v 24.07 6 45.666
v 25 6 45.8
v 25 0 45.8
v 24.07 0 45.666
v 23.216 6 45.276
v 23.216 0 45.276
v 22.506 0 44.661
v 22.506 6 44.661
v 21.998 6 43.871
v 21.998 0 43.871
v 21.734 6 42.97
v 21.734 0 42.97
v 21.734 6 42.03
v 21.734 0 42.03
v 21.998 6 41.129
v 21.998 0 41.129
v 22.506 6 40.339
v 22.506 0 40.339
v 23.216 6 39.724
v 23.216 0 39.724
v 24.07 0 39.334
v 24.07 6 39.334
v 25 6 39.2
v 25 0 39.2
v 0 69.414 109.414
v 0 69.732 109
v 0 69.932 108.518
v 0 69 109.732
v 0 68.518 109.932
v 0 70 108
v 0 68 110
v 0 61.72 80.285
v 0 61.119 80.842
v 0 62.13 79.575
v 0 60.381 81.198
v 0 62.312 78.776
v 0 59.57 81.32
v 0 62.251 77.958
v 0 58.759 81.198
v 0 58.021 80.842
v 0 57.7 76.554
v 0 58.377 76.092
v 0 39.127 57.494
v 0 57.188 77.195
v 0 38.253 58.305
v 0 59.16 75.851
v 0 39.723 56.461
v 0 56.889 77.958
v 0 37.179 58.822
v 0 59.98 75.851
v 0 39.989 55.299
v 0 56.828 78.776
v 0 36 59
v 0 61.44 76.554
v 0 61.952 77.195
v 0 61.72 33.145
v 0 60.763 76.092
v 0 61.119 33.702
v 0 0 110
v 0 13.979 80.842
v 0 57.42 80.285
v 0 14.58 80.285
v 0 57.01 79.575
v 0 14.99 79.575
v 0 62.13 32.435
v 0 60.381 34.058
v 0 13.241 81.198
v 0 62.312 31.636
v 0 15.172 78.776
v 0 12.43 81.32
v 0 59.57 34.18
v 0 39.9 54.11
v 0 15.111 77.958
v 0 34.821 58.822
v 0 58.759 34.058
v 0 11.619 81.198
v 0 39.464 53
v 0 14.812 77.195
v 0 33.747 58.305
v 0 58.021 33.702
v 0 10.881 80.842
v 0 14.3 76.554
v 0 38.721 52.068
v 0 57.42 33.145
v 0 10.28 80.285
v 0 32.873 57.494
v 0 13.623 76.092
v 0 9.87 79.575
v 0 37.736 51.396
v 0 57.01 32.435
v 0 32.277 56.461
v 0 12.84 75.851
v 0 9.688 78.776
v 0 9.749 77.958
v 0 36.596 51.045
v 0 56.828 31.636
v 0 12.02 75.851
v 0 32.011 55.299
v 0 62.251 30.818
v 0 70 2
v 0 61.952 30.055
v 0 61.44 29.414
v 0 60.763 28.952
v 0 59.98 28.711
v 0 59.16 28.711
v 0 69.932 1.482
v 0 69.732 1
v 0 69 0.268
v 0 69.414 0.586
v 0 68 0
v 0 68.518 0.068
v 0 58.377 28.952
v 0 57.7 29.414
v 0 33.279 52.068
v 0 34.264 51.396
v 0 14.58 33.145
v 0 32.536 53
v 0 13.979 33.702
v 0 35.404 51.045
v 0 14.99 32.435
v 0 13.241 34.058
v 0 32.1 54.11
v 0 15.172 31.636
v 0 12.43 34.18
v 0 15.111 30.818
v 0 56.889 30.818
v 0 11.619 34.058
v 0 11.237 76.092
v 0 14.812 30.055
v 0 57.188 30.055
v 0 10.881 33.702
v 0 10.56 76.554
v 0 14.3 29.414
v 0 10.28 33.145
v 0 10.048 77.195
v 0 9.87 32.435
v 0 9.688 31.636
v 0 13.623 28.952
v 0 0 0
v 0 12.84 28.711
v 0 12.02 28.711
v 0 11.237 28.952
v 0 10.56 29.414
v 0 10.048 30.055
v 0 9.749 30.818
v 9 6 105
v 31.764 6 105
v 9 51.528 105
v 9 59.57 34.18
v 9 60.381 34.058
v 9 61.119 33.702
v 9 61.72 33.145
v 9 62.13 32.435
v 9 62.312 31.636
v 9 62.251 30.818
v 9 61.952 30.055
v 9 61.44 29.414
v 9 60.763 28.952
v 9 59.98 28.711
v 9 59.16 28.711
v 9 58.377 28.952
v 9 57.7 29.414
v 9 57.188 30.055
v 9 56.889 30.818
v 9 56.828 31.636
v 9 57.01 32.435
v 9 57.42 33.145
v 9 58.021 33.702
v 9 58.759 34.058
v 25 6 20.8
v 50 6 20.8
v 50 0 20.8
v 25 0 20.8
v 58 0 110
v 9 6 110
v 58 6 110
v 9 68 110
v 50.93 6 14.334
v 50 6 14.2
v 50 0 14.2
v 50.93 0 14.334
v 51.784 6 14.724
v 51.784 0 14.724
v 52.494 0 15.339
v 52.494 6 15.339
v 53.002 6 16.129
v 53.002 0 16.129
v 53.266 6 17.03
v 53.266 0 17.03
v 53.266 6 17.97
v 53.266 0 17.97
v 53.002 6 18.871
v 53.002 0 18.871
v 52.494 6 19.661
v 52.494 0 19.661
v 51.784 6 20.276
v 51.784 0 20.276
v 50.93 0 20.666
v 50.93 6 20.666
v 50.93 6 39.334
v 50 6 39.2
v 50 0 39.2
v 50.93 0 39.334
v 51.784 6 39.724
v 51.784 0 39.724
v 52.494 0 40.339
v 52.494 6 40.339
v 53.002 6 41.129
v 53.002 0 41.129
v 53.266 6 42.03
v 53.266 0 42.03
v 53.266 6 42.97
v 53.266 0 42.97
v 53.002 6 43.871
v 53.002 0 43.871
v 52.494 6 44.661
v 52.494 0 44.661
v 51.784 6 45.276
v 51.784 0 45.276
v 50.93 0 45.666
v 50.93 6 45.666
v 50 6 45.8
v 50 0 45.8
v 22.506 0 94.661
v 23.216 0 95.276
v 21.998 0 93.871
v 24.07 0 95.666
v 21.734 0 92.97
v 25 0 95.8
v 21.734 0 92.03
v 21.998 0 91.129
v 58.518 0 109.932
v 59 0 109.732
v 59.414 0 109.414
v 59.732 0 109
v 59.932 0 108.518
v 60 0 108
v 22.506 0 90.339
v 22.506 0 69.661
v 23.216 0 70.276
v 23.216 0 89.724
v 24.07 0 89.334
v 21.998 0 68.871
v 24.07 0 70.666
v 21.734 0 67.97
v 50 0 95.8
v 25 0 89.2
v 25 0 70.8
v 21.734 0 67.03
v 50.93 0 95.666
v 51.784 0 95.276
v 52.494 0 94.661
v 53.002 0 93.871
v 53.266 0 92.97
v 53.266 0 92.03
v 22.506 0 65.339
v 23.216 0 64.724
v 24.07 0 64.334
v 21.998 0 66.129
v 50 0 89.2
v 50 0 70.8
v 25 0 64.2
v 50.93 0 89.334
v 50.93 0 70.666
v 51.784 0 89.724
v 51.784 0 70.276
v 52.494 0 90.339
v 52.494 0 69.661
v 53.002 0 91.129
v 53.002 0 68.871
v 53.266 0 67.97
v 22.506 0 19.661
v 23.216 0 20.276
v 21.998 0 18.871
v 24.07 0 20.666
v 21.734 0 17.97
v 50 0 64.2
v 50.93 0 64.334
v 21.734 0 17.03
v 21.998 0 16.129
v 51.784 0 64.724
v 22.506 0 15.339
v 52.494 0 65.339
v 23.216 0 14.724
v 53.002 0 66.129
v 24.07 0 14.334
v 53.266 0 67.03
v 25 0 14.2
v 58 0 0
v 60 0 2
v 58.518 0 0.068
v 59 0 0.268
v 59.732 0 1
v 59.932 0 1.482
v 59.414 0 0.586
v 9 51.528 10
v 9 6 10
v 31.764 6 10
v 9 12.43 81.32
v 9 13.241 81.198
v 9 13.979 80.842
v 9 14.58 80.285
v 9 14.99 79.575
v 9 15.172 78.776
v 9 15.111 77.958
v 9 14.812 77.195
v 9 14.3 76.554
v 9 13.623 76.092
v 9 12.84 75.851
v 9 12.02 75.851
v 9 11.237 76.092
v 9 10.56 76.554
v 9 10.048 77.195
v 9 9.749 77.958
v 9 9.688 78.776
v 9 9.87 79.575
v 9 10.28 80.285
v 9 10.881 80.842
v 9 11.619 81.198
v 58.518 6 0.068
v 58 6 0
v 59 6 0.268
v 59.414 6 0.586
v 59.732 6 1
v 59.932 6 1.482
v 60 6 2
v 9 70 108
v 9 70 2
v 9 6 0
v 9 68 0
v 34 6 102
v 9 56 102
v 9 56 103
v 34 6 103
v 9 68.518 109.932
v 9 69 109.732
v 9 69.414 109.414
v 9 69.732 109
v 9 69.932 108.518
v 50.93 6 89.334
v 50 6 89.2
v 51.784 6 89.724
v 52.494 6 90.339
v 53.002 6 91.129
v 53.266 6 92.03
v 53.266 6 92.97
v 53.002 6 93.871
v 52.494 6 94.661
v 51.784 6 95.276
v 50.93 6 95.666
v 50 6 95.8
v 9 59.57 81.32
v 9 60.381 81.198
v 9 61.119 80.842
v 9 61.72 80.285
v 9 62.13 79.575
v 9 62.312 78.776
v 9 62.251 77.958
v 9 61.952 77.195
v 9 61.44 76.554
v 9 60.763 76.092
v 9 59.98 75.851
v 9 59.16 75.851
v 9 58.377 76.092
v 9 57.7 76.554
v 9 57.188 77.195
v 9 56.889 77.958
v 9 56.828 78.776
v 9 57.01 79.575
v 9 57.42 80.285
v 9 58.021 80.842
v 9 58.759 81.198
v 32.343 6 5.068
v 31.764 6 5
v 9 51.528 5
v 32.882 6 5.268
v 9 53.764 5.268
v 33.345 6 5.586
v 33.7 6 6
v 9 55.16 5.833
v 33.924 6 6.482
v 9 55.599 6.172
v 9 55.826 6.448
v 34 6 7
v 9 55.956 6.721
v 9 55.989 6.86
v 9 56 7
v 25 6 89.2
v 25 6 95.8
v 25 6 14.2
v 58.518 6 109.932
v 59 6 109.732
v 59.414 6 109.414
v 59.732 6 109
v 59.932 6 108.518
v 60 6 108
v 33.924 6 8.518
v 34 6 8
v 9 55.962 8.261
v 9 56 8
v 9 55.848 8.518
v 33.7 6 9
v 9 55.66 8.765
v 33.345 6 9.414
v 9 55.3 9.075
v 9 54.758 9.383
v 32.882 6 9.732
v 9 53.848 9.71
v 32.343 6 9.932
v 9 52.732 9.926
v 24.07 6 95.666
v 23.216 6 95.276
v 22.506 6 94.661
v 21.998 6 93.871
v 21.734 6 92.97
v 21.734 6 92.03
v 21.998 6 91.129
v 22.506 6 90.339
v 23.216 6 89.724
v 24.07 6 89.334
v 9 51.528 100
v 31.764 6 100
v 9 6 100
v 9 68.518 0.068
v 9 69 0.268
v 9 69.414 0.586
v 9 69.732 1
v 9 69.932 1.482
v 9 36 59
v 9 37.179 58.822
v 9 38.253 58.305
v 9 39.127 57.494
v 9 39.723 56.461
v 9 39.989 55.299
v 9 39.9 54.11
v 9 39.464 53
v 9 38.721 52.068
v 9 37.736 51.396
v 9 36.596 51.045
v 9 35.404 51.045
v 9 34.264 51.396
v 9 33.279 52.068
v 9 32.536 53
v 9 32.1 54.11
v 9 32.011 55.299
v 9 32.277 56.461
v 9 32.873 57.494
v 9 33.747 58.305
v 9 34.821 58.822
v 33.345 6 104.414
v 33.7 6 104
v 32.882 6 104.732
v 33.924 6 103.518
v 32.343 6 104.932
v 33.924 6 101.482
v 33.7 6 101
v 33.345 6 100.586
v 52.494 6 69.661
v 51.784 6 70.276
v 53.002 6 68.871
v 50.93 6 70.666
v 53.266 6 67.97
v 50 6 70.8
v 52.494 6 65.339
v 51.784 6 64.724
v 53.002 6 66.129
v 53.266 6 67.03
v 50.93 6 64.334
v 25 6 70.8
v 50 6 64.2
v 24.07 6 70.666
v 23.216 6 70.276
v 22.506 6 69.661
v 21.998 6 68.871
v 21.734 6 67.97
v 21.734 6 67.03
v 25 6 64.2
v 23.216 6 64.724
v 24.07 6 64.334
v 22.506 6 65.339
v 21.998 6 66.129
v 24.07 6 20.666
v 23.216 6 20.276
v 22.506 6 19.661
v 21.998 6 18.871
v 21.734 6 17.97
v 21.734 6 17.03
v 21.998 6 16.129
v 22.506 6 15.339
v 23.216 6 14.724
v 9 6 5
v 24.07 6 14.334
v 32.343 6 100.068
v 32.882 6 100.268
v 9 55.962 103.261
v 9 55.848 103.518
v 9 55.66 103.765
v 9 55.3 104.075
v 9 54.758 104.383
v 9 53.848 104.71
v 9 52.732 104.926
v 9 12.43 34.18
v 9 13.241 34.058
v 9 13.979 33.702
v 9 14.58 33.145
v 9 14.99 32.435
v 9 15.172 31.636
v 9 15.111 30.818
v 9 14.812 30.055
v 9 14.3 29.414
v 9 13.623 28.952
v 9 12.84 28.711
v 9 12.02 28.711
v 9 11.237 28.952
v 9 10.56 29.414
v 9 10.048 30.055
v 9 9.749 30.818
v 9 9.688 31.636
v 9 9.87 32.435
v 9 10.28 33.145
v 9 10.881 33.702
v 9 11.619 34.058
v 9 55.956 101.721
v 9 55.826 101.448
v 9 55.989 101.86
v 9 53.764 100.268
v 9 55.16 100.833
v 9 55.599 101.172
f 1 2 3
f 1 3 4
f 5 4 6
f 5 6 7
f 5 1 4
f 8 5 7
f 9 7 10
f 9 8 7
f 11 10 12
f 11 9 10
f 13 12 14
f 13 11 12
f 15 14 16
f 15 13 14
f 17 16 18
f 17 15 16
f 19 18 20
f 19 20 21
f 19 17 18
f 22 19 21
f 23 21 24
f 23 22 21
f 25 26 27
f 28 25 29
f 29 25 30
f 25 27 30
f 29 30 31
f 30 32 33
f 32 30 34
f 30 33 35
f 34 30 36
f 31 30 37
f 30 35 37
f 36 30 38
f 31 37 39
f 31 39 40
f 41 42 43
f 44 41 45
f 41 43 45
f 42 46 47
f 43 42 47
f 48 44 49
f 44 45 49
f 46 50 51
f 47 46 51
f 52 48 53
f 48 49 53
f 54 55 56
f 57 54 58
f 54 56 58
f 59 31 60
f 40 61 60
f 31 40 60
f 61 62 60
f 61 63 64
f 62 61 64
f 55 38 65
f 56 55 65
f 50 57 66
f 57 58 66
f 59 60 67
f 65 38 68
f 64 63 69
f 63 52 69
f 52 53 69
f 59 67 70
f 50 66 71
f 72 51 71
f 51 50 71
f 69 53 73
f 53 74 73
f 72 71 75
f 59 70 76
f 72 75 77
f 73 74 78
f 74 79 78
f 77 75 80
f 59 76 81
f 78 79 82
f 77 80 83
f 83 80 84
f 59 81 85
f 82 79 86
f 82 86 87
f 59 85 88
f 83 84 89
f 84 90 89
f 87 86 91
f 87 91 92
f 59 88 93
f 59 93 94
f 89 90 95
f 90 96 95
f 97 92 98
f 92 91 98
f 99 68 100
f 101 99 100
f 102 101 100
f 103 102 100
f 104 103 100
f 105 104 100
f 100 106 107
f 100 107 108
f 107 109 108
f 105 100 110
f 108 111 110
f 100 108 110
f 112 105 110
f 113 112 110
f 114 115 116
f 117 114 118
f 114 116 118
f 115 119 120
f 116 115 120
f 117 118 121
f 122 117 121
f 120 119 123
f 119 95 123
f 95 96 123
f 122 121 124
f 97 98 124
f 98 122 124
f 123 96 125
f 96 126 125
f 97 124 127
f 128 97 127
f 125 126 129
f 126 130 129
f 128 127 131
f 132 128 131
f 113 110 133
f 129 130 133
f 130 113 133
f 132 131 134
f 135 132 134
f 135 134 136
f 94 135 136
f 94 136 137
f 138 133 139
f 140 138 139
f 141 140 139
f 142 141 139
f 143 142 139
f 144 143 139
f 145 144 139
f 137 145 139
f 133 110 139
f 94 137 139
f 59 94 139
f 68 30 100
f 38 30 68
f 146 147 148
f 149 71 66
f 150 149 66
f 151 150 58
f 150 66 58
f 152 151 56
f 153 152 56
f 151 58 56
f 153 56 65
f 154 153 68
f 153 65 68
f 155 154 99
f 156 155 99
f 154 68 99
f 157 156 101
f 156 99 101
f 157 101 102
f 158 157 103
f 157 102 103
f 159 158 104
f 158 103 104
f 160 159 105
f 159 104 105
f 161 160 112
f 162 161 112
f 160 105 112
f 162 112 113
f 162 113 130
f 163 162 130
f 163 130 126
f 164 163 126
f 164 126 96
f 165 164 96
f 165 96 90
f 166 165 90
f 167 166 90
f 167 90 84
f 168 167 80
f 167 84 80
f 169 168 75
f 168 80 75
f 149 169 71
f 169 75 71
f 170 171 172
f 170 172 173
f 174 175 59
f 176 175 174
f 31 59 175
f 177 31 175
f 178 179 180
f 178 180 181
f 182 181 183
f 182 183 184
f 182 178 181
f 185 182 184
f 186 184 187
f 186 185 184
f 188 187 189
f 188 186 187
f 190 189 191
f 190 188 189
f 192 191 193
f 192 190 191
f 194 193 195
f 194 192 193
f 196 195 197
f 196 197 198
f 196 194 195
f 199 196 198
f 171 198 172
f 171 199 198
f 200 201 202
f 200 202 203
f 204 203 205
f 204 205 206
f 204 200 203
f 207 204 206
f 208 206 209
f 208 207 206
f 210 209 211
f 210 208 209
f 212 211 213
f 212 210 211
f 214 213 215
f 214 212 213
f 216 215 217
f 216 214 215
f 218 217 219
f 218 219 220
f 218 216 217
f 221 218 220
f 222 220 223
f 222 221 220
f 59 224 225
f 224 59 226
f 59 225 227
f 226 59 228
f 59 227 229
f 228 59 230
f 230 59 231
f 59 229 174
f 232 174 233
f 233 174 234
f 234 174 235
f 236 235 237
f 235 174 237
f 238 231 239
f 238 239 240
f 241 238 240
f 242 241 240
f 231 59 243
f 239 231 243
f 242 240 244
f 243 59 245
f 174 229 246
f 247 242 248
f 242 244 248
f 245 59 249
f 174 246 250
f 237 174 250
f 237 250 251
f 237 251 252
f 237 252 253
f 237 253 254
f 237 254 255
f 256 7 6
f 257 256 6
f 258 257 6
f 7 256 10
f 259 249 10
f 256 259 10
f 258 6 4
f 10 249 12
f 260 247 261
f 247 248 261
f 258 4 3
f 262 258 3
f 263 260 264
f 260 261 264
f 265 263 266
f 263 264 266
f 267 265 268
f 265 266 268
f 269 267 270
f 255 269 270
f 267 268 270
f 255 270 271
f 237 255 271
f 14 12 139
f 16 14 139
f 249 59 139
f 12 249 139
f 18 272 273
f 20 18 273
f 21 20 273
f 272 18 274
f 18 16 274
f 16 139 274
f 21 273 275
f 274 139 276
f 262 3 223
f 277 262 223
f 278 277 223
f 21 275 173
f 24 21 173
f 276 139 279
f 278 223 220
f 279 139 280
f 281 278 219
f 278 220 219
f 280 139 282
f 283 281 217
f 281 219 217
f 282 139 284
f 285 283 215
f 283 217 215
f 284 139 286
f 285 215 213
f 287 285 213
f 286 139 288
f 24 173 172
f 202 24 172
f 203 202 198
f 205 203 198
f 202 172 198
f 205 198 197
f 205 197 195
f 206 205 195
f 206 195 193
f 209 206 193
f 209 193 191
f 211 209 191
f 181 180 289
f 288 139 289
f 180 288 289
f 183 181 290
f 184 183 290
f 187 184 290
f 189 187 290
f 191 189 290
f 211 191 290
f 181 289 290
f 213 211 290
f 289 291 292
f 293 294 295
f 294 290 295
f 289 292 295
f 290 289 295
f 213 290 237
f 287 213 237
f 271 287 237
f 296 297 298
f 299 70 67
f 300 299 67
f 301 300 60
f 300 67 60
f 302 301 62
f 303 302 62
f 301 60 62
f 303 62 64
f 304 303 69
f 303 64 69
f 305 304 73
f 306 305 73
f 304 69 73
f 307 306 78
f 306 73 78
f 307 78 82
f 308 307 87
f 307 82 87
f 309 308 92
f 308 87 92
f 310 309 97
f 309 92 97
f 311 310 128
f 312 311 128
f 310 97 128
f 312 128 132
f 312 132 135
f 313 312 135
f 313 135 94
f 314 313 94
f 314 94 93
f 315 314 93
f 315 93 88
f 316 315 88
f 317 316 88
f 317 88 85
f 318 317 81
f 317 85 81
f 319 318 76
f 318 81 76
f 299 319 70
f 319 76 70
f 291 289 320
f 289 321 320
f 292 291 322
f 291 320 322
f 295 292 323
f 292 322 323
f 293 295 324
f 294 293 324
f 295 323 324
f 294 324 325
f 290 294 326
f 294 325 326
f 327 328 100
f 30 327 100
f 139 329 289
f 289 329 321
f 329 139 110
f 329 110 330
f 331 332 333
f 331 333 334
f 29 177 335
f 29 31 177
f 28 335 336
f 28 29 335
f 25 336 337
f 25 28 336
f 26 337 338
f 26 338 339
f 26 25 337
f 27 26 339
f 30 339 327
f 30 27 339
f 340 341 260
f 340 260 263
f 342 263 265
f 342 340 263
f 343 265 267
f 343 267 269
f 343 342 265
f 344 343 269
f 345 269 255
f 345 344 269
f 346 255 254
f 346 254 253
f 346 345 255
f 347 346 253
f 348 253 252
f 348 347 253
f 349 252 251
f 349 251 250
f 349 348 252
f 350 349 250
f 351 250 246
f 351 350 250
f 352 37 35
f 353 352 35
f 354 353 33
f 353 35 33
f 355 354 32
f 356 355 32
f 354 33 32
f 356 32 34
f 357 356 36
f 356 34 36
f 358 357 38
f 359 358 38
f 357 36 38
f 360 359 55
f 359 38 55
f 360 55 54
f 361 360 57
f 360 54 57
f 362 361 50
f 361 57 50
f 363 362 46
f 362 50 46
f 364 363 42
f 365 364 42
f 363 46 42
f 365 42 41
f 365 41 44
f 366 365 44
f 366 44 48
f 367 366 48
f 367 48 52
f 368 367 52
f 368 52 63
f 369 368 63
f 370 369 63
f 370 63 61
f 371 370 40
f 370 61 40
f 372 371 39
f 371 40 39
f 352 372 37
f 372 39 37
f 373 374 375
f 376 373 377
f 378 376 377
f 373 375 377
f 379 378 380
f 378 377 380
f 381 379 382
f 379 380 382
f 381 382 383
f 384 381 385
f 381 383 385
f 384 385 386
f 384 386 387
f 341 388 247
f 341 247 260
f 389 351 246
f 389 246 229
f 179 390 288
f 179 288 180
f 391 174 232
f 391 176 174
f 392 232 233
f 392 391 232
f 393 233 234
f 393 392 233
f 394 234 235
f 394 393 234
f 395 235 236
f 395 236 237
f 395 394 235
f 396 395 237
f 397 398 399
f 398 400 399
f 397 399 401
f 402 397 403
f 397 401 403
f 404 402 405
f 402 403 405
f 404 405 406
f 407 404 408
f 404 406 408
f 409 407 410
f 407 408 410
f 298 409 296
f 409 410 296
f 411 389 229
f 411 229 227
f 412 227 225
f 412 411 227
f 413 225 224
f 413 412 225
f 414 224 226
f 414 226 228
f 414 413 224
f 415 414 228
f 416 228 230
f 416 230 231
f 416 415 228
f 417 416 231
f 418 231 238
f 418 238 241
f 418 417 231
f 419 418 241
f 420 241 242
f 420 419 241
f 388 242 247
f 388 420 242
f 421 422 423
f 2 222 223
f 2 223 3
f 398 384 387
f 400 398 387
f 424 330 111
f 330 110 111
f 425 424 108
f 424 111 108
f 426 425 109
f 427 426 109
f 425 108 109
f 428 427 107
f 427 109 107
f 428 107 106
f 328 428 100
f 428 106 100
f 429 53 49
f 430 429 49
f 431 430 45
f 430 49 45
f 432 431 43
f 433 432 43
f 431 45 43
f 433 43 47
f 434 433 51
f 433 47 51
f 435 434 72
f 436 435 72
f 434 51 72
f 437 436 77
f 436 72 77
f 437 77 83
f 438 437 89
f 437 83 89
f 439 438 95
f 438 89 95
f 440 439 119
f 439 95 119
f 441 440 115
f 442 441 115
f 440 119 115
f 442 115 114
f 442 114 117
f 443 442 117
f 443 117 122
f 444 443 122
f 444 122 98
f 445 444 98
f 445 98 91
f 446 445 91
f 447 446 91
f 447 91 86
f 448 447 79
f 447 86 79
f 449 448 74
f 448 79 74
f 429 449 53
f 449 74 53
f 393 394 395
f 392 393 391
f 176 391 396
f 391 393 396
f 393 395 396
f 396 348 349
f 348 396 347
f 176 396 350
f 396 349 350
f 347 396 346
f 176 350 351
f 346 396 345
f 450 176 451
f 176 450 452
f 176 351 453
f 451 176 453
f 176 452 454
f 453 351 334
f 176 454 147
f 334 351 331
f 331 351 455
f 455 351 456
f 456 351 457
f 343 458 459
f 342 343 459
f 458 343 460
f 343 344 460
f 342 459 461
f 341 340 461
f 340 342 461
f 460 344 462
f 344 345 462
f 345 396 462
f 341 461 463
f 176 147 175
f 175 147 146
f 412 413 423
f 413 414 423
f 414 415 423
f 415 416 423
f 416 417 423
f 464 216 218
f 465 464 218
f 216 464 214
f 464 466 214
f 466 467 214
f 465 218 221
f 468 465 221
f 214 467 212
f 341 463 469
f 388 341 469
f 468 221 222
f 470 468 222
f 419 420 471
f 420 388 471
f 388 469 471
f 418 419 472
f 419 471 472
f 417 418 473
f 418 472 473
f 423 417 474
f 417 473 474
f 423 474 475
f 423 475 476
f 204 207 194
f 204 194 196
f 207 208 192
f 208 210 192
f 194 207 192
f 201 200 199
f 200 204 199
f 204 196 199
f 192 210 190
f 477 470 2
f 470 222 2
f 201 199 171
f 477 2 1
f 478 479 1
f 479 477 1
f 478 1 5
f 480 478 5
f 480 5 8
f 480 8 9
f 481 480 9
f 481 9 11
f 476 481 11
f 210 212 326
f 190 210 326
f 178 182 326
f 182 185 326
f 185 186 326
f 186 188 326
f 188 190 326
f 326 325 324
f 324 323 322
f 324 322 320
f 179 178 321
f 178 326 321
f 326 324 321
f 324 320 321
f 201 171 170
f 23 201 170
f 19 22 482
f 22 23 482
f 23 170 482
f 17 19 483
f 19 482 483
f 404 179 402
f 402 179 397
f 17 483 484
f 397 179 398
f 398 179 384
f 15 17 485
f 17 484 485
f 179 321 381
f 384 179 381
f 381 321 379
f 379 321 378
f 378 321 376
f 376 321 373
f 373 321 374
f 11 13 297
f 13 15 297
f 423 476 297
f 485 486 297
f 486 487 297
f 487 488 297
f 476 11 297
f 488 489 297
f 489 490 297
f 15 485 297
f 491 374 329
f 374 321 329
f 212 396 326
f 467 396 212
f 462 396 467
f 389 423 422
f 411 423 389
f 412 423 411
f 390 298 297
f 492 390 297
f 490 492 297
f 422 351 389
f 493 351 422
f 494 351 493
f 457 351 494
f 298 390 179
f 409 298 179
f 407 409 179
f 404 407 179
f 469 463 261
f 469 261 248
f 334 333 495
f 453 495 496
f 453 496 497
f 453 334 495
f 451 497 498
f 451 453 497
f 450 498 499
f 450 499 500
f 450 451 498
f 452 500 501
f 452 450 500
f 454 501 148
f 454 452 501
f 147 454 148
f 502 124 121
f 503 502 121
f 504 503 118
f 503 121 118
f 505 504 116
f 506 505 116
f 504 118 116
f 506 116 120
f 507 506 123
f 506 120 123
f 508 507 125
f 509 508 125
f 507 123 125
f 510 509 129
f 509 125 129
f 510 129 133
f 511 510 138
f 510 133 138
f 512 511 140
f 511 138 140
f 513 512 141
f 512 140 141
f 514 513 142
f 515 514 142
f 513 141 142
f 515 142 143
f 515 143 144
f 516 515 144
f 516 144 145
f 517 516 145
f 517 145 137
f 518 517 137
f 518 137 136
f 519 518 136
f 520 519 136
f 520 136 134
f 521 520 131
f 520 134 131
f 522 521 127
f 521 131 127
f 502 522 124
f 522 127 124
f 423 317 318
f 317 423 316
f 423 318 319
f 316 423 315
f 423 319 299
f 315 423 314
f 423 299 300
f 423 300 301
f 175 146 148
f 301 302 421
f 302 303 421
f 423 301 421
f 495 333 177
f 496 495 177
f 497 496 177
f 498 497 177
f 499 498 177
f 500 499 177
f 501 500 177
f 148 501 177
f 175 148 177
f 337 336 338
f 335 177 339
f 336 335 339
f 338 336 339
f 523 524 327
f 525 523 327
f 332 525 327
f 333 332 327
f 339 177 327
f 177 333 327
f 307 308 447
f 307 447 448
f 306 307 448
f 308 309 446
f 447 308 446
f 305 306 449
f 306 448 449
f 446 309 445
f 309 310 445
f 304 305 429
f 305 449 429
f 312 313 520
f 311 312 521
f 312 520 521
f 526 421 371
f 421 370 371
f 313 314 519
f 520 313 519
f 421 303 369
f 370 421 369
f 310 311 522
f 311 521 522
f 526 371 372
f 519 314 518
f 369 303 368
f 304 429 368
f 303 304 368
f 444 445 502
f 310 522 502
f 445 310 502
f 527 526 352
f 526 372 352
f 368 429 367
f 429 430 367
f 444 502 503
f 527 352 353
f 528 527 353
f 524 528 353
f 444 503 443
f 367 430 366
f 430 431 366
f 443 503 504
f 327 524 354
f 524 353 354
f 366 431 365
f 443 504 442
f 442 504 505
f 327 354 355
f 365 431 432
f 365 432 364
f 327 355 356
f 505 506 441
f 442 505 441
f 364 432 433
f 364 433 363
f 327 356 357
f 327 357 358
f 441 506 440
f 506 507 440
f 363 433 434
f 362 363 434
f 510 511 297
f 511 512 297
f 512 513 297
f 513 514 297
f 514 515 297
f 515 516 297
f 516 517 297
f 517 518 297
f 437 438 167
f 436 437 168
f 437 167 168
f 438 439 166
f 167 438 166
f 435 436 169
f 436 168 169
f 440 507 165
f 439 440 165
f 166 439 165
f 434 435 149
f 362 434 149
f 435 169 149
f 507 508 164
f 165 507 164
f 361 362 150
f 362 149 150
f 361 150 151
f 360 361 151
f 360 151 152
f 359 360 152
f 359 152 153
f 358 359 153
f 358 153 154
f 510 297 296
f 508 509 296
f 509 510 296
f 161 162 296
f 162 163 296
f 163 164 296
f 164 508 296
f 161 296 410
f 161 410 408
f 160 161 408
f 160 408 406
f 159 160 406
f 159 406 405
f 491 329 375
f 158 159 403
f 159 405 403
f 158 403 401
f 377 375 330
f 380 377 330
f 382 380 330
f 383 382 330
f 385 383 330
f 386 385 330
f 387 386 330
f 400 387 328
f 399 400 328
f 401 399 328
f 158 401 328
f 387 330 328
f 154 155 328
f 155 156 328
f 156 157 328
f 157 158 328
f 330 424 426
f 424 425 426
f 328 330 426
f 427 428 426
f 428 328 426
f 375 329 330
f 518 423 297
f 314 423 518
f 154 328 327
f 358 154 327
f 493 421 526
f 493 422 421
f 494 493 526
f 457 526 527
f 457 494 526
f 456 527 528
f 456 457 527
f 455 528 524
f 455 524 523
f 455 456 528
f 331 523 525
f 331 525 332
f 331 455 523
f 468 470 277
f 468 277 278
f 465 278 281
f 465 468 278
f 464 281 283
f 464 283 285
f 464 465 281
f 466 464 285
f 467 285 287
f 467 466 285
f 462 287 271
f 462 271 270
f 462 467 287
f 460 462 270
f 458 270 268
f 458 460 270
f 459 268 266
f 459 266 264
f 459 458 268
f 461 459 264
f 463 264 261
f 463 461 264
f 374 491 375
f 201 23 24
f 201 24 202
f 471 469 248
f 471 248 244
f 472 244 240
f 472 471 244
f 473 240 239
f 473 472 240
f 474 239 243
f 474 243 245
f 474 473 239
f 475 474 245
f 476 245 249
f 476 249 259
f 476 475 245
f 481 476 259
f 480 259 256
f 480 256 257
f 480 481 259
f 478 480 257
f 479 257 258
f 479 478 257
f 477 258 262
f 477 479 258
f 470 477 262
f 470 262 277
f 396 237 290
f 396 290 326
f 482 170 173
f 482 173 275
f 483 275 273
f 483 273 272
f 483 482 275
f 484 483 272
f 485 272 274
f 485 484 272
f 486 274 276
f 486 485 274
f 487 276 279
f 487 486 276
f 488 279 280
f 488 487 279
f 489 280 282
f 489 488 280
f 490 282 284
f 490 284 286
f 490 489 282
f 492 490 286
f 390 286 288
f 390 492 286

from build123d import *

# Parameters (mm, degrees)
BOSS_EXTRUDE1_DEPTH      = 110
SKETCH2_R                = 4
SKETCH2_R_2              = 2.75
CUT_EXTRUDE1_DEPTH       = 9
CUT_EXTRUDE2_DEPTH       = 6
BOSS_EXTRUDE2_DEPTH      = 3
BOSS_EXTRUDE2_DEPTH_BACK = 2
BOSS_EXTRUDE4_DEPTH      = 2
BOSS_EXTRUDE4_DEPTH_BACK = 3
FILLET1_R                = 2


with BuildPart() as part:
    # Sketch1 → Boss-Extrude1 (new body)
    with BuildSketch(Plane.XY):
        Polygon((0, 0), (60, 0), (60, 6), (9, 6), (9, 70), (0, 70), align=None)
    extrude(amount=BOSS_EXTRUDE1_DEPTH)

    # Sketch2 → Cut-Extrude1 (cut)
    with BuildSketch(Plane.ZY):
        with Locations((55, 36)):
            Circle(SKETCH2_R)
        with Locations((78.57, 59.57)):
            Circle(SKETCH2_R_2)
        with Locations((31.43, 59.57)):
            Circle(SKETCH2_R_2)
        with Locations((31.43, 12.43)):
            Circle(SKETCH2_R_2)
        with Locations((78.57, 12.43)):
            Circle(SKETCH2_R_2)
    extrude(amount=-CUT_EXTRUDE1_DEPTH, mode=Mode.SUBTRACT)

    # Sketch3 → Cut-Extrude2 (cut)
    with BuildSketch(Plane(origin=(0, 6, 0), x_dir=(1, 0, 0), z_dir=(0, 1, 0))):
        with BuildLine():
            Line((25, -14.2), (50, -14.2))
            ThreePointArc((50, -14.2), (53.3, -17.5), (50, -20.8))
            Line((50, -20.8), (25, -20.8))
            ThreePointArc((25, -20.8), (21.7, -17.5), (25, -14.2))
        make_face()
        with BuildLine():
            Line((25, -39.2), (50, -39.2))
            ThreePointArc((50, -39.2), (53.3, -42.5), (50, -45.8))
            Line((50, -45.8), (25, -45.8))
            ThreePointArc((25, -45.8), (21.7, -42.5), (25, -39.2))
        make_face()
        with BuildLine():
            Line((25, -64.2), (50, -64.2))
            ThreePointArc((50, -64.2), (53.3, -67.5), (50, -70.8))
            Line((50, -70.8), (25, -70.8))
            ThreePointArc((25, -70.8), (21.7, -67.5), (25, -64.2))
        make_face()
        with BuildLine():
            Line((25, -89.2), (50, -89.2))
            ThreePointArc((50, -89.2), (53.3, -92.5), (50, -95.8))
            Line((50, -95.8), (25, -95.8))
            ThreePointArc((25, -95.8), (21.7, -92.5), (25, -89.2))
        make_face()
    extrude(amount=-CUT_EXTRUDE2_DEPTH, mode=Mode.SUBTRACT)

    # Sketch7 → Boss-Extrude2 (add, two sides: drawn at the far end of the back side and taken through both)
    with BuildSketch(Plane.XY.offset(102).offset(-BOSS_EXTRUDE2_DEPTH_BACK)):
        Polygon((9, 56), (34, 6), (9, 6), align=None)
    extrude(amount=BOSS_EXTRUDE2_DEPTH + BOSS_EXTRUDE2_DEPTH_BACK)

    # Sketch9 → Boss-Extrude4 (add, two sides: drawn at the far end of the back side and taken through both)
    with BuildSketch(Plane.XY.offset(8).offset(-BOSS_EXTRUDE4_DEPTH_BACK)):
        Polygon((9, 56), (9, 6), (34, 6), align=None)
    extrude(amount=BOSS_EXTRUDE4_DEPTH + BOSS_EXTRUDE4_DEPTH_BACK)

    # Fillet1
    fillet1_edges = [part.edges().sort_by_distance(p)[0] for p in [
        (21.5, 31, 100),
        (21.5, 31, 105),
        (21.5, 31, 5),
        (21.5, 31, 10),
        (60, 3, 110),
        (4.5, 70, 110),
        (4.5, 70, 0),
        (60, 3, 0),
    ]]
    fillet(fillet1_edges, radius=FILLET1_R)


solid = part.part
